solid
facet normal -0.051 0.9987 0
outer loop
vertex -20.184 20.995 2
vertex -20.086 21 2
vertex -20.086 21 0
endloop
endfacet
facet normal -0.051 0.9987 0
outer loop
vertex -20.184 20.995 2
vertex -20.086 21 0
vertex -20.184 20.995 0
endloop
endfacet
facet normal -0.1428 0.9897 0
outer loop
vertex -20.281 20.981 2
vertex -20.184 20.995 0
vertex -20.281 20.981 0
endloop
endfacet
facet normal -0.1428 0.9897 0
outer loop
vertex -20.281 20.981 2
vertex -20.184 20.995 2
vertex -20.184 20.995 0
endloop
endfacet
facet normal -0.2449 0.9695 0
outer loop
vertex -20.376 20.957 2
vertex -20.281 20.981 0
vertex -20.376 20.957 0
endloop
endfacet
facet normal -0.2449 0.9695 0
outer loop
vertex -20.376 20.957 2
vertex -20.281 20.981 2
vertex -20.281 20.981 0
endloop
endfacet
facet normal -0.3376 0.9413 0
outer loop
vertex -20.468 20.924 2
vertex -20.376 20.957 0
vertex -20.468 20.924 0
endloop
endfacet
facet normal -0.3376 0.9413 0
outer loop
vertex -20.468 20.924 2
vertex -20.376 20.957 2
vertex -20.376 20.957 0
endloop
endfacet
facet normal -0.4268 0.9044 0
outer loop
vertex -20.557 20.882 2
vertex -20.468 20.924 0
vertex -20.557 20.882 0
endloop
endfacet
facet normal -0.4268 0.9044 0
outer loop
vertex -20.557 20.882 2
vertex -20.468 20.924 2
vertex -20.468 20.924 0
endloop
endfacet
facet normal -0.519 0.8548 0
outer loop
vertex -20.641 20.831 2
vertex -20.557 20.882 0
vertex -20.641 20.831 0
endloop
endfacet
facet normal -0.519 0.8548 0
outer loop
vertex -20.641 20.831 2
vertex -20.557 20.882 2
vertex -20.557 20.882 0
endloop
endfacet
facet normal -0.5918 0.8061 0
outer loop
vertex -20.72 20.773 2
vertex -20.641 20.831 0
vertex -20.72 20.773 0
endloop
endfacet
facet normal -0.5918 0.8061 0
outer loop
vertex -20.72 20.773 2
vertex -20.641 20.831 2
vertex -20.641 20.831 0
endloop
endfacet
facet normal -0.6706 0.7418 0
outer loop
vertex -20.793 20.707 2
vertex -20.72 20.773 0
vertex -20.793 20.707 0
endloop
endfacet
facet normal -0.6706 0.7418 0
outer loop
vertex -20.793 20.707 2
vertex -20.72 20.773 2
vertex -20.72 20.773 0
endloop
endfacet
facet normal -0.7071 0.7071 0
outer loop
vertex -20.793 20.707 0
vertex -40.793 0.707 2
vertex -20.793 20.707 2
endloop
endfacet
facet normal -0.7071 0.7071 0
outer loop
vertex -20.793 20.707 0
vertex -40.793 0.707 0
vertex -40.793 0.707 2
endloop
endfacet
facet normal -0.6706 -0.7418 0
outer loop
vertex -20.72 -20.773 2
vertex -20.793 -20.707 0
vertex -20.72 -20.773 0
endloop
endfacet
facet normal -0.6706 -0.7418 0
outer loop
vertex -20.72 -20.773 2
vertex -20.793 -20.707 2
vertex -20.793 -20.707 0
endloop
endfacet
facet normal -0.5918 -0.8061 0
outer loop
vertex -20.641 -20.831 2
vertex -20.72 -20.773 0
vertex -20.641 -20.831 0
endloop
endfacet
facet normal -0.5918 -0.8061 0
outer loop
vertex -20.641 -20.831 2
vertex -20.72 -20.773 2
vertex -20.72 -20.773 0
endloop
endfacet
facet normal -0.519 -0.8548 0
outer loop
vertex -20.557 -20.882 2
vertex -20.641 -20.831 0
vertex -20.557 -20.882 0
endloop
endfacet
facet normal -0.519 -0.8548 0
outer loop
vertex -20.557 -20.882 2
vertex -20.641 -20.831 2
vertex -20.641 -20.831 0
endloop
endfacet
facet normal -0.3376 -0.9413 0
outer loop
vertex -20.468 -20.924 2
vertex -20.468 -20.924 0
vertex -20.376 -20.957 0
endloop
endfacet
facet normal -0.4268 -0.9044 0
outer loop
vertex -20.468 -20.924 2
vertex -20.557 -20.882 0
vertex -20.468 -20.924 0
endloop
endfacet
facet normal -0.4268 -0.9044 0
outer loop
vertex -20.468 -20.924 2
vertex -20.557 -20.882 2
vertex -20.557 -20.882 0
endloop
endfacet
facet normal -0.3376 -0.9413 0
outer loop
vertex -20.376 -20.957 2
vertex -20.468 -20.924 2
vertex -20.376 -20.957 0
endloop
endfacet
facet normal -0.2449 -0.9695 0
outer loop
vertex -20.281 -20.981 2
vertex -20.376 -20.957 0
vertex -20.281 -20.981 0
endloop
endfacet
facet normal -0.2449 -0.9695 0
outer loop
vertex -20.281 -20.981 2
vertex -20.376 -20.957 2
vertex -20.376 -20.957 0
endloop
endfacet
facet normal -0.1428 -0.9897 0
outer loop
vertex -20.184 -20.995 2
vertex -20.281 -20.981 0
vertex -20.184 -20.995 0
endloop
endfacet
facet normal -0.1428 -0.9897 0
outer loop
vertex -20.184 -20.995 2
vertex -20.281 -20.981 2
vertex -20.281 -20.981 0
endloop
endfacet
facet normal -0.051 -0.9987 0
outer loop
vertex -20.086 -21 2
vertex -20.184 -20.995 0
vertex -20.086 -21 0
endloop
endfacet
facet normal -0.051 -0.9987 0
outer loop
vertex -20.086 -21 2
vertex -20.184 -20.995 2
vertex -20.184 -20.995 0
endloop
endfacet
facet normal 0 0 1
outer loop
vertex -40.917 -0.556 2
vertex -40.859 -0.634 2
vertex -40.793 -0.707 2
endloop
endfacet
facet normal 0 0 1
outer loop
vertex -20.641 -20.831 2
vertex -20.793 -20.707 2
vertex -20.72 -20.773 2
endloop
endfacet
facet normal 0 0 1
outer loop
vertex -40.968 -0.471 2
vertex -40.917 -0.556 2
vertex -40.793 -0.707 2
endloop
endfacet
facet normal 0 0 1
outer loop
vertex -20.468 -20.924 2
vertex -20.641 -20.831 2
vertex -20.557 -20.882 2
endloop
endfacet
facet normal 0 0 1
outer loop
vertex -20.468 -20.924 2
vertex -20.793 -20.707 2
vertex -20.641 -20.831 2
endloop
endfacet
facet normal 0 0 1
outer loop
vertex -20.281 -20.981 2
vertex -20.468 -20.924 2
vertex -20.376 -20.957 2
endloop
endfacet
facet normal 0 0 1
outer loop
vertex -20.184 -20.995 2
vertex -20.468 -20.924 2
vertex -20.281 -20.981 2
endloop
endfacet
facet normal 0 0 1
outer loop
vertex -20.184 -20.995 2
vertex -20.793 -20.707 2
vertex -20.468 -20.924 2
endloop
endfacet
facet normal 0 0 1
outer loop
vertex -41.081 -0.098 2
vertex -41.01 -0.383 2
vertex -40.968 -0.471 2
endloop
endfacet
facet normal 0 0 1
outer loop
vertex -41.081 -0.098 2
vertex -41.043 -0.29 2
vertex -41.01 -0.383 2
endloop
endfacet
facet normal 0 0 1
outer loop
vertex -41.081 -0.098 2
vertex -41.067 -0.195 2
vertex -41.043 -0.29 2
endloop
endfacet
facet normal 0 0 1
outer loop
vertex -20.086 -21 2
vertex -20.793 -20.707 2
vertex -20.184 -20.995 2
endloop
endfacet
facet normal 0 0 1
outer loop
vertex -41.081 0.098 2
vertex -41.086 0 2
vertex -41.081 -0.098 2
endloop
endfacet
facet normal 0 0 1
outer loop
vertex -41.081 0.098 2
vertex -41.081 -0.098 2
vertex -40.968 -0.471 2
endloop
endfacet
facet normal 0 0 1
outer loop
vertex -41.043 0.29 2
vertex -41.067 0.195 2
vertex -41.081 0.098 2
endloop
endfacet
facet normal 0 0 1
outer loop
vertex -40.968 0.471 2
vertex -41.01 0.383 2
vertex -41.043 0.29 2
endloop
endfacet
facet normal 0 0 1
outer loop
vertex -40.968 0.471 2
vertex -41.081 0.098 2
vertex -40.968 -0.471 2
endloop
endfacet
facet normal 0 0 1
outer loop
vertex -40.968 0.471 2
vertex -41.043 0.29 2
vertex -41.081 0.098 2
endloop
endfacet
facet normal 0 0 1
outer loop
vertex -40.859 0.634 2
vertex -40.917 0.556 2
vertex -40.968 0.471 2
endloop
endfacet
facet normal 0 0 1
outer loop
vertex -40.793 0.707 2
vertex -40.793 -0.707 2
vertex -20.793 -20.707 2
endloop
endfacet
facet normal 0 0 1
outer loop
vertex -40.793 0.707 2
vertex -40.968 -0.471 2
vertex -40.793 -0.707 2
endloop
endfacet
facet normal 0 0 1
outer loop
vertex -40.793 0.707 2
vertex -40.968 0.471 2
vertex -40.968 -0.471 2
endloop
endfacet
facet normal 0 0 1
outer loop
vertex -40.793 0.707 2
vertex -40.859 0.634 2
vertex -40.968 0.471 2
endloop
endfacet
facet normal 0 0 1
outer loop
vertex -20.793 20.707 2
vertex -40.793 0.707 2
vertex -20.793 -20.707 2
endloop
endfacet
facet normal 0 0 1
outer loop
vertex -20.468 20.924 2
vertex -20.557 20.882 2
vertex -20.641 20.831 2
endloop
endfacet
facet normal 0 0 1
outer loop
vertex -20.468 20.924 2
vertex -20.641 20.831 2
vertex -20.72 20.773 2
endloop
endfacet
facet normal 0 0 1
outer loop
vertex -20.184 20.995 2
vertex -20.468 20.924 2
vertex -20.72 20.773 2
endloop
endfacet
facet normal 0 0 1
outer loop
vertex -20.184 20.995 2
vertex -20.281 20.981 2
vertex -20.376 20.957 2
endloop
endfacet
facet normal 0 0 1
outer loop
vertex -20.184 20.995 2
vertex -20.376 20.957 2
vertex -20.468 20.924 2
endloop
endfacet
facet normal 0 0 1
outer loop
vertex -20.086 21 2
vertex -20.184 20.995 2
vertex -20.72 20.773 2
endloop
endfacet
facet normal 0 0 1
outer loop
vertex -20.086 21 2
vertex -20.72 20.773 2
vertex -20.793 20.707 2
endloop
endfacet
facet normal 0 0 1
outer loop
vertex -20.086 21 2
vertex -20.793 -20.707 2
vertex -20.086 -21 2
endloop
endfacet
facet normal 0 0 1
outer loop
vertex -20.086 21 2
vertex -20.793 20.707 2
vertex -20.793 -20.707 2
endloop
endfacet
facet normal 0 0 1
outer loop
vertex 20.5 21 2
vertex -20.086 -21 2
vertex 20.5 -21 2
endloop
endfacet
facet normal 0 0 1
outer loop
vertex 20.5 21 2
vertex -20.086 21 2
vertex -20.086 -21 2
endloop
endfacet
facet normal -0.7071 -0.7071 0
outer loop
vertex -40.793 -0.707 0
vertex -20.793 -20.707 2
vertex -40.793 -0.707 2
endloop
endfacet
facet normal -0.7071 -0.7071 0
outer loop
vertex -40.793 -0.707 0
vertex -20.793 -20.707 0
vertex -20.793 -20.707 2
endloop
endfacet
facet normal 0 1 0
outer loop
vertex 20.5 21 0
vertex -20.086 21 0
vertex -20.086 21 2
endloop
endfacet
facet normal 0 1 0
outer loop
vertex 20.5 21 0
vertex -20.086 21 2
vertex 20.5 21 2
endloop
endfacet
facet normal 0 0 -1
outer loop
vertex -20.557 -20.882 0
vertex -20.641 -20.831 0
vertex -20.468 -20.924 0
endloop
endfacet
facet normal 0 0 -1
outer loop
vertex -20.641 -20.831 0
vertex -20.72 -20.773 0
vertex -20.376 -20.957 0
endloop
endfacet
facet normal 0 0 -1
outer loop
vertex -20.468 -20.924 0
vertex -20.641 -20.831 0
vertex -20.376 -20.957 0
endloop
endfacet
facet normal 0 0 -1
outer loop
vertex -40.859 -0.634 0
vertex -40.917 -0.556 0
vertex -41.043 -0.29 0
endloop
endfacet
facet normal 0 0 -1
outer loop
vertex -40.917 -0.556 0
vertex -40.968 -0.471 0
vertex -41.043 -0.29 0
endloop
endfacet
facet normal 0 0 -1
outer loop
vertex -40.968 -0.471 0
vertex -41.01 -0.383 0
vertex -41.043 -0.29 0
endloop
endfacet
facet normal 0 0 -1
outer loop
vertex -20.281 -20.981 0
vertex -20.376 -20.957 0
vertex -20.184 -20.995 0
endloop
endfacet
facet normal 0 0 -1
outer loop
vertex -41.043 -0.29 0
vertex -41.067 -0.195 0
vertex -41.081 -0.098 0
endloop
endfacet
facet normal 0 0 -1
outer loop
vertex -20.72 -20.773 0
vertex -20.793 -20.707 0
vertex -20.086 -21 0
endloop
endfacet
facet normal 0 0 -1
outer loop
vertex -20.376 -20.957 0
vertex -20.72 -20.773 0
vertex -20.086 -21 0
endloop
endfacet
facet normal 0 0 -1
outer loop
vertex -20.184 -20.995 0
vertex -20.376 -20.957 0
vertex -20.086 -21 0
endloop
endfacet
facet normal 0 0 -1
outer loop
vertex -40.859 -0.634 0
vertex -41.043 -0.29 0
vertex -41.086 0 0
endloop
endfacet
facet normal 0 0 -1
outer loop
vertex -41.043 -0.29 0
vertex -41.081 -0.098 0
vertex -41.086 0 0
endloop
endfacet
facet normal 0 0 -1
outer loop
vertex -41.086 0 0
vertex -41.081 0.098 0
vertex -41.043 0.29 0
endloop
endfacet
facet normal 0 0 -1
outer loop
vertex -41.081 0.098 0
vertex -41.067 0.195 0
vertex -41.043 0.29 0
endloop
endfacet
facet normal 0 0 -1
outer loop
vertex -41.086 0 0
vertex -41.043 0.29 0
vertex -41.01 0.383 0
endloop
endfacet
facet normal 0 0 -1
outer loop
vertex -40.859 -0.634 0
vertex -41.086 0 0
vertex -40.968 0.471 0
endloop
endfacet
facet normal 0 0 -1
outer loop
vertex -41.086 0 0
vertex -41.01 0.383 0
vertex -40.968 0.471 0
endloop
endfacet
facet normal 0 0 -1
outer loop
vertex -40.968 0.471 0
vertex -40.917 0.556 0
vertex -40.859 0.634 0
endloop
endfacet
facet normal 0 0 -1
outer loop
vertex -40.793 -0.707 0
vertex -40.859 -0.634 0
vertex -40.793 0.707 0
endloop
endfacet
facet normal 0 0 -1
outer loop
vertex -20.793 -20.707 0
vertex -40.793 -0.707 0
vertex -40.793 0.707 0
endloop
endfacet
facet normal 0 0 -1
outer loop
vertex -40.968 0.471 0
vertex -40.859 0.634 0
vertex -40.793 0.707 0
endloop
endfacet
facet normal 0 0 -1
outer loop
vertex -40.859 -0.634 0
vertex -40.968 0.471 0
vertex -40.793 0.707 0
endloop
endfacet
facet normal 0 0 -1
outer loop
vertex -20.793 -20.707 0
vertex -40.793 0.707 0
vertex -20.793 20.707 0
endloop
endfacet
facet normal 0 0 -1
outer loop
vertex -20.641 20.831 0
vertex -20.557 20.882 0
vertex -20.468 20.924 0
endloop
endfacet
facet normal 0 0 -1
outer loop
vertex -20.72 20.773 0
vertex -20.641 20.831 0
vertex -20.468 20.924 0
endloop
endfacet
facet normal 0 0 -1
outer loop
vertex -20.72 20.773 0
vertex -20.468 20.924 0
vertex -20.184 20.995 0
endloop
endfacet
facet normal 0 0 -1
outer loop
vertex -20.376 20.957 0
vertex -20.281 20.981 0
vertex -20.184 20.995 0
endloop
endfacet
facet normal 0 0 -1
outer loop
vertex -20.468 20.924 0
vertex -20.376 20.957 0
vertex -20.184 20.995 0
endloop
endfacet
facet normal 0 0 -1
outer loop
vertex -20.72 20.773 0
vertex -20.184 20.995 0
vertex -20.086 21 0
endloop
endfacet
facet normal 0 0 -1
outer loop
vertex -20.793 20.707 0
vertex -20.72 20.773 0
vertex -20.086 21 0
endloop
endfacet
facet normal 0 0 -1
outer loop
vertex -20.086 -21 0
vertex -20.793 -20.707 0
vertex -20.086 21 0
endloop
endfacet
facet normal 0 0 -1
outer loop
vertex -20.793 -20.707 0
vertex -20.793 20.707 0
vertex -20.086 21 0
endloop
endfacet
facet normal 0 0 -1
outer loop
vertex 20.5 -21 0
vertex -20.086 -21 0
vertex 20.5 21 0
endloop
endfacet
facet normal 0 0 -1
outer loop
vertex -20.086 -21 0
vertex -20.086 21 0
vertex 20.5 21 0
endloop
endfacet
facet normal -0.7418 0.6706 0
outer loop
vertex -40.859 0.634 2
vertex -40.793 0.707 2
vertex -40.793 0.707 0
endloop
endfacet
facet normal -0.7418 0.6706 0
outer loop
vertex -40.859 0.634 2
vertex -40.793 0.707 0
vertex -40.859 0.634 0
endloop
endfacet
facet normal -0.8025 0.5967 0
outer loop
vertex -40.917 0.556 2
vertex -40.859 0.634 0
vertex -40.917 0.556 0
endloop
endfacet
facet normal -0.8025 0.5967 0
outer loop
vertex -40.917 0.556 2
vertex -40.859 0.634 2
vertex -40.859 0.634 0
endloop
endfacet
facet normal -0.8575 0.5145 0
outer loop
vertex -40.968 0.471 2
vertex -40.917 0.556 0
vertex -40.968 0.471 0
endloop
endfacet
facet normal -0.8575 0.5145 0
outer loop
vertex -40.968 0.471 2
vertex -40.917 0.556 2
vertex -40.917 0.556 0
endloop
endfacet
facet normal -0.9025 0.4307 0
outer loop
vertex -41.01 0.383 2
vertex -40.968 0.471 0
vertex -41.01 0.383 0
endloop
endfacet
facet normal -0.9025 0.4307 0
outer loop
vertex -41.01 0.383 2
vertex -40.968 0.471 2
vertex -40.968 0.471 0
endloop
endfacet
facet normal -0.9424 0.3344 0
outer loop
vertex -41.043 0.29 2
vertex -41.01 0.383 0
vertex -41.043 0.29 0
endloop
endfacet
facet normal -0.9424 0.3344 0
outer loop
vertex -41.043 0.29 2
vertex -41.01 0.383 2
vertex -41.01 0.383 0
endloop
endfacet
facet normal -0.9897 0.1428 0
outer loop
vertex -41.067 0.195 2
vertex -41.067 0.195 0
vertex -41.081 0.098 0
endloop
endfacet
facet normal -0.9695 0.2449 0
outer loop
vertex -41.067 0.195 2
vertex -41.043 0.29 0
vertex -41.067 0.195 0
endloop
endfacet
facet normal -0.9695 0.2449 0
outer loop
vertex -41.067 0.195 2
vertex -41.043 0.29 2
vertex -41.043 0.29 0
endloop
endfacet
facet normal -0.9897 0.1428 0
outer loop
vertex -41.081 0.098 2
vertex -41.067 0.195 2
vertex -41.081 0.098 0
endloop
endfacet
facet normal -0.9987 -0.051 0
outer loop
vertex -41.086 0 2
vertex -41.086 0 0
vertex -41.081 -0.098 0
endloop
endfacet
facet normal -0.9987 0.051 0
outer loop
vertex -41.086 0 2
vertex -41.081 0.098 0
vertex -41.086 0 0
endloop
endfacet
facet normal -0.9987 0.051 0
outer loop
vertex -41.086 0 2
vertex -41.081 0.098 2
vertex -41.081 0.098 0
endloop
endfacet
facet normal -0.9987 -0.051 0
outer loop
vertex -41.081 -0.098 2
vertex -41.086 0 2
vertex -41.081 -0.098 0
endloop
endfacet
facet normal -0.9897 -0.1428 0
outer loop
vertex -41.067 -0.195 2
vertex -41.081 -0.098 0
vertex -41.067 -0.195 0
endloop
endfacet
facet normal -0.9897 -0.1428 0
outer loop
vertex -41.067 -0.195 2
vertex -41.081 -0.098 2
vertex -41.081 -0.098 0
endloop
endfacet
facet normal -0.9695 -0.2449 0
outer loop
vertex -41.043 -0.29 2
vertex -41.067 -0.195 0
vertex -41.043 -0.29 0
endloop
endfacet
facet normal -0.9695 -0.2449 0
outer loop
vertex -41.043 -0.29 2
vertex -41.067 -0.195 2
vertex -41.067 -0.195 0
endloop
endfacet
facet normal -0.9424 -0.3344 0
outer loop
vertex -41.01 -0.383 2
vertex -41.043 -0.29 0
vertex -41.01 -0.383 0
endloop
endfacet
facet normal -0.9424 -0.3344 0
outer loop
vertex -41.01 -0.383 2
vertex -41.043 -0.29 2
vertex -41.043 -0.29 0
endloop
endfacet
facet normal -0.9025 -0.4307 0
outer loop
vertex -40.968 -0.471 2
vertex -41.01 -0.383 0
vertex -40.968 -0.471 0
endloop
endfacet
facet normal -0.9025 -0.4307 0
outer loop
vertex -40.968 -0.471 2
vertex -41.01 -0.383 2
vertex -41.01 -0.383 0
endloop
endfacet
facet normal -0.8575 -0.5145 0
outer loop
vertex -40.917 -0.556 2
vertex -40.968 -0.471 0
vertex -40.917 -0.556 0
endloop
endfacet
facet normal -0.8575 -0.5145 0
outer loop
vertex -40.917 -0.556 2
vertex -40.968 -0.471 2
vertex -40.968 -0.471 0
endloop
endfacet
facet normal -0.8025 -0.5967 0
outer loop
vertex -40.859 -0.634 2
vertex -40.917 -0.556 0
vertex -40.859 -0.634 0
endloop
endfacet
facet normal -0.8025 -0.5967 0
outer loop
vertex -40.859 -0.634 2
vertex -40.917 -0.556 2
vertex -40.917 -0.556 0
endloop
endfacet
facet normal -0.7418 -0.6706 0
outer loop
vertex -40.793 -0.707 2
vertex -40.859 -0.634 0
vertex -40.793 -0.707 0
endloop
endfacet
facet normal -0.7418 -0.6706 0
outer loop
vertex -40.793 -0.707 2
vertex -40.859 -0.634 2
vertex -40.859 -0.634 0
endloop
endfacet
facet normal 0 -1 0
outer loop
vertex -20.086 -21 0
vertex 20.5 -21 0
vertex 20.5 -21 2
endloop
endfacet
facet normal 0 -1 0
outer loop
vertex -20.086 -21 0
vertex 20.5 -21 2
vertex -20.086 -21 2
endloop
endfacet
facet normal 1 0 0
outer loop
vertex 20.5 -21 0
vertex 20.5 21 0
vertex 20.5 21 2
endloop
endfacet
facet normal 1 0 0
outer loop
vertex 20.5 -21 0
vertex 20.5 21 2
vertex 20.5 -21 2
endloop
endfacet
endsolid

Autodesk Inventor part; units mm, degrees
ref_plane "YZ Plane" through (0, 0, 0) normal (1, 0, 0) x (0, 1, 0)
ref_plane "XZ Plane" through (0, 0, 0) normal (0, 1, 0) x (-1, 0, 0)
ref_plane "XY Plane" through (0, 0, 0) normal (0, 0, 1) x (1, 0, 0)
sketch "Sketch1" plane through (0, 0, 0) normal (0, 0, 1) x (1, 0, 0)
  line L0 (-20.5, 21) -> (20.5, 21)
  line L1 (20.5, 21) -> (20.5, -21)
  line L2 (20.5, -21) -> (-20.5, -21)
  line L3 (-20.5, -21) -> (-20.5, 21) construction
  line L4 (-20.5, 21) -> (20.5, -21) construction
  line L5 (-20.5, -21) -> (-41.5, 0)
  line L6 (-41.5, 0) -> (-20.5, 21)
  point P0 (0, 0)
  point P1 (0, 0)
  point P2 (20.5, 0)
  dimension "d0" = 41
  dimension "d1" = 42
  dimension "d4" = 62
extrude "Plate1" add sketch "Sketch1" along normal blind 2
fillet "Corner Round2" radius 1 3 edges at (-20.5, -21, 1) (-41.5, 0, 1) (-20.5, 21, 1)
equation "\"d2\" = Thickness"
equation "\"BendReliefWidth\" = Thickness"
equation "\"BendReliefDepth\" = 0.5 * Thickness"
equation "\"CornerReliefSize\" = 4 * Thickness"
equation "\"MinimumRemnant\" = 2 * Thickness"
equation "\"TransitionRadius\" = BendRadius"
equation "\"JacobiRadiusSize\" = BendRadius"
equation "\"GapSize\" = Thickness"
equation "\"Thickness\" = 2"
equation "\"BendRadius\" = 2.75"
properties part number "MNT-CDF-604 CAP" material "Stainless Steel"
